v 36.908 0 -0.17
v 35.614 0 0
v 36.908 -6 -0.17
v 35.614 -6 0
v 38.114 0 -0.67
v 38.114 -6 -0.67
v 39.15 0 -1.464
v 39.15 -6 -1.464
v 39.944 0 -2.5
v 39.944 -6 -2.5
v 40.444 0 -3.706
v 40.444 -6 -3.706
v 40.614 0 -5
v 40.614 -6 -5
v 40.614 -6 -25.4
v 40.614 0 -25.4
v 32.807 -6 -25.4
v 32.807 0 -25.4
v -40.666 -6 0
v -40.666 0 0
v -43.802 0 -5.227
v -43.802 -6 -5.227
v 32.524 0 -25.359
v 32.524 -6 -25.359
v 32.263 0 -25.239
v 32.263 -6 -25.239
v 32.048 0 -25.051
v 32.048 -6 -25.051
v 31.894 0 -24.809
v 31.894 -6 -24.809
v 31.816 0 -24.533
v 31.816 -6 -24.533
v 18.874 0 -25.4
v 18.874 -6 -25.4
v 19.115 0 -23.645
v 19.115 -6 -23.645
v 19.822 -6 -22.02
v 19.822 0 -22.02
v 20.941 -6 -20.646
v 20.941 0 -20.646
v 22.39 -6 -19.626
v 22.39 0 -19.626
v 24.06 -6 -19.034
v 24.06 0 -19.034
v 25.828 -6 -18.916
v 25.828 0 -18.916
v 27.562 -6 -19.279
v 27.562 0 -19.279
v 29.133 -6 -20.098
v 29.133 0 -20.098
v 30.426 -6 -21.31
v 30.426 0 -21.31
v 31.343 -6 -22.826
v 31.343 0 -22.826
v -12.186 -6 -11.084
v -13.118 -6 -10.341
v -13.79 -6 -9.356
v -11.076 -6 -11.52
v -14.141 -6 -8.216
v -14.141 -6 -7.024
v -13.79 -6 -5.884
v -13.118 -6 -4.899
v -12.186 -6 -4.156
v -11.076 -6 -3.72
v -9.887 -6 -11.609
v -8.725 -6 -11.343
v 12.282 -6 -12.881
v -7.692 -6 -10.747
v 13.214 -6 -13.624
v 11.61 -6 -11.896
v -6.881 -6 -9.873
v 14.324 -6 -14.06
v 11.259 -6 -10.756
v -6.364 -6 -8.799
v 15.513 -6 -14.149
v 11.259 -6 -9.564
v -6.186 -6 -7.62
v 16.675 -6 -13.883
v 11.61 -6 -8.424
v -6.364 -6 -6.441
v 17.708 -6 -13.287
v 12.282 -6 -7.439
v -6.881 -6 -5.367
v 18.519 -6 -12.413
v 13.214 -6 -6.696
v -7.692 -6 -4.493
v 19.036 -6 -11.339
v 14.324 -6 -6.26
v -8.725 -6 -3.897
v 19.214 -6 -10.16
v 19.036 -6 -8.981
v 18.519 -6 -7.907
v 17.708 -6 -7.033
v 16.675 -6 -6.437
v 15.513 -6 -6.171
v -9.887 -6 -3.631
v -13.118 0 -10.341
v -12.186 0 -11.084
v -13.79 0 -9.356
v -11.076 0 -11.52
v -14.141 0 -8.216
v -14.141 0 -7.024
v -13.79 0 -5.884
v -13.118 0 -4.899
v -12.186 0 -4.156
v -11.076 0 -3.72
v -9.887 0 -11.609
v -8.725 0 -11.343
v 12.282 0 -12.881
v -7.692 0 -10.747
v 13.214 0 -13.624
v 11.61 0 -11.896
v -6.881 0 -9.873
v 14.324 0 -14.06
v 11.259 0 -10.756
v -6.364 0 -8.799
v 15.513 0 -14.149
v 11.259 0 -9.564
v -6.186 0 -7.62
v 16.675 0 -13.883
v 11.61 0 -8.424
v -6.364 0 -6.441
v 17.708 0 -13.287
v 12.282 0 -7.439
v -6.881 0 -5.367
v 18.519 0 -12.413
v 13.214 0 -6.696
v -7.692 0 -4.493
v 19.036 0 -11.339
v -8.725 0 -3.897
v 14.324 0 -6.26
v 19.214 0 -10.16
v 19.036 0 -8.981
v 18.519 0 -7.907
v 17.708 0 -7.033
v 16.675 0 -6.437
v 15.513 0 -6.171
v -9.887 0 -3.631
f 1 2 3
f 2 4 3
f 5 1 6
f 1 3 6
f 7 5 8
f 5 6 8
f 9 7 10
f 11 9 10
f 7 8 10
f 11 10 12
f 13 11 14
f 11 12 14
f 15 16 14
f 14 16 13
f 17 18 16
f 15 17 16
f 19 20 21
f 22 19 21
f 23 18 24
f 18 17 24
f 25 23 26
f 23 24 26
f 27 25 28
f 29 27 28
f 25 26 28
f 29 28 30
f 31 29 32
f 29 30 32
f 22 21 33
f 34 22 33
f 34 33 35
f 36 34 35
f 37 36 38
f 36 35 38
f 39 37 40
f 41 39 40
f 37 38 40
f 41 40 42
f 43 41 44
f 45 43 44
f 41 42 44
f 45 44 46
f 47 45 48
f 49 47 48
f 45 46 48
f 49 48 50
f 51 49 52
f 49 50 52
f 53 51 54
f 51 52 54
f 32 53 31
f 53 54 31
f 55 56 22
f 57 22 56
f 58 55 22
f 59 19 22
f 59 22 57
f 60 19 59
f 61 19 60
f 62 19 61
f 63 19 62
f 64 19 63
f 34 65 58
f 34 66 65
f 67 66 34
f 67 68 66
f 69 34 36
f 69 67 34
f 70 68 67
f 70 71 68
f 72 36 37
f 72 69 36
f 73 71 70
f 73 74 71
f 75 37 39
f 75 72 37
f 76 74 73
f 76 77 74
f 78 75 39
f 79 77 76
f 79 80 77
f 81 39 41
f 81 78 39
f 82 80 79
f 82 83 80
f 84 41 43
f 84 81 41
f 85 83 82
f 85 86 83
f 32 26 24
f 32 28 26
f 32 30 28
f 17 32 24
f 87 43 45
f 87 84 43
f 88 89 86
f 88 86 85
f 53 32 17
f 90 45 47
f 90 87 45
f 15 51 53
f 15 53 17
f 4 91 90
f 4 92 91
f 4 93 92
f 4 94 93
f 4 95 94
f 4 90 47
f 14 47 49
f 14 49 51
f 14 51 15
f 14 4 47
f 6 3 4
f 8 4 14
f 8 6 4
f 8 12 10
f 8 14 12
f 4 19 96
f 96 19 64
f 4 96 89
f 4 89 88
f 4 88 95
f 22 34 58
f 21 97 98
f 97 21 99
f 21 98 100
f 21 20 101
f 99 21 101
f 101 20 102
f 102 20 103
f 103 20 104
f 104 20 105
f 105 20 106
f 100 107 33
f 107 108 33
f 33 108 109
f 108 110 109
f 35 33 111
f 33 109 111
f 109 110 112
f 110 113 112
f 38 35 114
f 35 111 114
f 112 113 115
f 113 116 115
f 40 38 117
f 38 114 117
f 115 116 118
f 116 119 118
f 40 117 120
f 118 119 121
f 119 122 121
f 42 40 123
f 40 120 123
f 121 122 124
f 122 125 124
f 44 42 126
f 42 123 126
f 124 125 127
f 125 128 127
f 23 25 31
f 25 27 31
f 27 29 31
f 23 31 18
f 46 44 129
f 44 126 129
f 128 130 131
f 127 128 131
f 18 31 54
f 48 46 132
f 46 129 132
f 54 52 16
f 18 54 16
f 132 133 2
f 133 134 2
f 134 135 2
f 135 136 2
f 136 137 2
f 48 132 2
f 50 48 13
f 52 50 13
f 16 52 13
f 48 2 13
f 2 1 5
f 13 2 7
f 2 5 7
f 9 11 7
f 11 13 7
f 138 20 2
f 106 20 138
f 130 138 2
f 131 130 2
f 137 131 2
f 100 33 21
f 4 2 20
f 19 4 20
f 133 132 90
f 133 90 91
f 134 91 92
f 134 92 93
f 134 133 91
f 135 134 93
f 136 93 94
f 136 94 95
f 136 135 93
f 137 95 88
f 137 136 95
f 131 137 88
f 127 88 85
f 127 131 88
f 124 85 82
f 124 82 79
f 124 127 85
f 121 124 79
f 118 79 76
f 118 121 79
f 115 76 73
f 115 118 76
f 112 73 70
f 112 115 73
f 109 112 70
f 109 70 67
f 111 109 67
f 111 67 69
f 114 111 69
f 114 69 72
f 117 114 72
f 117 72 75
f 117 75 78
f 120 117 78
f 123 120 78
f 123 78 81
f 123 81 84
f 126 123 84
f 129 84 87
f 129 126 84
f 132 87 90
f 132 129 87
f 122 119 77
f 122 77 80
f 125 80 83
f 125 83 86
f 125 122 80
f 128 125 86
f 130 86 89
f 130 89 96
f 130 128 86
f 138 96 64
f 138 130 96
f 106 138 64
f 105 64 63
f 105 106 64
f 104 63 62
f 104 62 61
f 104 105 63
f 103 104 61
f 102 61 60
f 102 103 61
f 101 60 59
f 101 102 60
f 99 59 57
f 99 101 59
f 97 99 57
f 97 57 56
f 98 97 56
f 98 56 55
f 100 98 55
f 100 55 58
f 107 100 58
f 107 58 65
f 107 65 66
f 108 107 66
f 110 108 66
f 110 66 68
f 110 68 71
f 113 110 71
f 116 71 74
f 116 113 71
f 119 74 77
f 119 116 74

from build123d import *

# Parameters (mm, degrees)
F0_R     = 4
F1_DEPTH = 6
F2_R     = 5
F3_R     = 1


with BuildPart() as f1:
    # F0 (on Front) → F1 (new body)
    with BuildSketch(Plane.XZ):
        with BuildLine():
            Line((40.613971, 0), (-40.666029, 0))
            Line((-40.666029, 0), (-43.802427, -5.227331))
            Line((-43.802427, -5.227331), (18.873971, -25.4))
            ThreePointArc((18.873971, -25.4), (25.373971, -18.9), (31.873971, -25.4))
            Line((31.873971, -25.4), (35.371493, -25.4))
            Line((35.371493, -25.4), (40.613971, -25.4))
            Line((40.613971, -25.4), (40.613971, -10.16))
            Line((40.613971, -10.16), (40.613971, -7.62))
            Line((40.613971, -7.62), (40.613971, -6.35))
            Line((40.613971, -6.35), (40.613971, 0))
        make_face()
        with Locations((-10.186029, -7.62)):
            Circle(F0_R, mode=Mode.SUBTRACT)
        with Locations((15.213971, -10.16)):
            Circle(F0_R, mode=Mode.SUBTRACT)
    extrude(amount=F1_DEPTH)

    # F2
    f2_edges = [f1.edges().sort_by_distance(p)[0] for p in [
        (40.613971, -3, 0),
    ]]
    fillet(f2_edges, radius=F2_R)

    # F3
    f3_edges = [f1.edges().sort_by_distance(p)[0] for p in [
        (31.873971, -3, -25.4),
    ]]
    fillet(f3_edges, radius=F3_R)


solid = f1.part
